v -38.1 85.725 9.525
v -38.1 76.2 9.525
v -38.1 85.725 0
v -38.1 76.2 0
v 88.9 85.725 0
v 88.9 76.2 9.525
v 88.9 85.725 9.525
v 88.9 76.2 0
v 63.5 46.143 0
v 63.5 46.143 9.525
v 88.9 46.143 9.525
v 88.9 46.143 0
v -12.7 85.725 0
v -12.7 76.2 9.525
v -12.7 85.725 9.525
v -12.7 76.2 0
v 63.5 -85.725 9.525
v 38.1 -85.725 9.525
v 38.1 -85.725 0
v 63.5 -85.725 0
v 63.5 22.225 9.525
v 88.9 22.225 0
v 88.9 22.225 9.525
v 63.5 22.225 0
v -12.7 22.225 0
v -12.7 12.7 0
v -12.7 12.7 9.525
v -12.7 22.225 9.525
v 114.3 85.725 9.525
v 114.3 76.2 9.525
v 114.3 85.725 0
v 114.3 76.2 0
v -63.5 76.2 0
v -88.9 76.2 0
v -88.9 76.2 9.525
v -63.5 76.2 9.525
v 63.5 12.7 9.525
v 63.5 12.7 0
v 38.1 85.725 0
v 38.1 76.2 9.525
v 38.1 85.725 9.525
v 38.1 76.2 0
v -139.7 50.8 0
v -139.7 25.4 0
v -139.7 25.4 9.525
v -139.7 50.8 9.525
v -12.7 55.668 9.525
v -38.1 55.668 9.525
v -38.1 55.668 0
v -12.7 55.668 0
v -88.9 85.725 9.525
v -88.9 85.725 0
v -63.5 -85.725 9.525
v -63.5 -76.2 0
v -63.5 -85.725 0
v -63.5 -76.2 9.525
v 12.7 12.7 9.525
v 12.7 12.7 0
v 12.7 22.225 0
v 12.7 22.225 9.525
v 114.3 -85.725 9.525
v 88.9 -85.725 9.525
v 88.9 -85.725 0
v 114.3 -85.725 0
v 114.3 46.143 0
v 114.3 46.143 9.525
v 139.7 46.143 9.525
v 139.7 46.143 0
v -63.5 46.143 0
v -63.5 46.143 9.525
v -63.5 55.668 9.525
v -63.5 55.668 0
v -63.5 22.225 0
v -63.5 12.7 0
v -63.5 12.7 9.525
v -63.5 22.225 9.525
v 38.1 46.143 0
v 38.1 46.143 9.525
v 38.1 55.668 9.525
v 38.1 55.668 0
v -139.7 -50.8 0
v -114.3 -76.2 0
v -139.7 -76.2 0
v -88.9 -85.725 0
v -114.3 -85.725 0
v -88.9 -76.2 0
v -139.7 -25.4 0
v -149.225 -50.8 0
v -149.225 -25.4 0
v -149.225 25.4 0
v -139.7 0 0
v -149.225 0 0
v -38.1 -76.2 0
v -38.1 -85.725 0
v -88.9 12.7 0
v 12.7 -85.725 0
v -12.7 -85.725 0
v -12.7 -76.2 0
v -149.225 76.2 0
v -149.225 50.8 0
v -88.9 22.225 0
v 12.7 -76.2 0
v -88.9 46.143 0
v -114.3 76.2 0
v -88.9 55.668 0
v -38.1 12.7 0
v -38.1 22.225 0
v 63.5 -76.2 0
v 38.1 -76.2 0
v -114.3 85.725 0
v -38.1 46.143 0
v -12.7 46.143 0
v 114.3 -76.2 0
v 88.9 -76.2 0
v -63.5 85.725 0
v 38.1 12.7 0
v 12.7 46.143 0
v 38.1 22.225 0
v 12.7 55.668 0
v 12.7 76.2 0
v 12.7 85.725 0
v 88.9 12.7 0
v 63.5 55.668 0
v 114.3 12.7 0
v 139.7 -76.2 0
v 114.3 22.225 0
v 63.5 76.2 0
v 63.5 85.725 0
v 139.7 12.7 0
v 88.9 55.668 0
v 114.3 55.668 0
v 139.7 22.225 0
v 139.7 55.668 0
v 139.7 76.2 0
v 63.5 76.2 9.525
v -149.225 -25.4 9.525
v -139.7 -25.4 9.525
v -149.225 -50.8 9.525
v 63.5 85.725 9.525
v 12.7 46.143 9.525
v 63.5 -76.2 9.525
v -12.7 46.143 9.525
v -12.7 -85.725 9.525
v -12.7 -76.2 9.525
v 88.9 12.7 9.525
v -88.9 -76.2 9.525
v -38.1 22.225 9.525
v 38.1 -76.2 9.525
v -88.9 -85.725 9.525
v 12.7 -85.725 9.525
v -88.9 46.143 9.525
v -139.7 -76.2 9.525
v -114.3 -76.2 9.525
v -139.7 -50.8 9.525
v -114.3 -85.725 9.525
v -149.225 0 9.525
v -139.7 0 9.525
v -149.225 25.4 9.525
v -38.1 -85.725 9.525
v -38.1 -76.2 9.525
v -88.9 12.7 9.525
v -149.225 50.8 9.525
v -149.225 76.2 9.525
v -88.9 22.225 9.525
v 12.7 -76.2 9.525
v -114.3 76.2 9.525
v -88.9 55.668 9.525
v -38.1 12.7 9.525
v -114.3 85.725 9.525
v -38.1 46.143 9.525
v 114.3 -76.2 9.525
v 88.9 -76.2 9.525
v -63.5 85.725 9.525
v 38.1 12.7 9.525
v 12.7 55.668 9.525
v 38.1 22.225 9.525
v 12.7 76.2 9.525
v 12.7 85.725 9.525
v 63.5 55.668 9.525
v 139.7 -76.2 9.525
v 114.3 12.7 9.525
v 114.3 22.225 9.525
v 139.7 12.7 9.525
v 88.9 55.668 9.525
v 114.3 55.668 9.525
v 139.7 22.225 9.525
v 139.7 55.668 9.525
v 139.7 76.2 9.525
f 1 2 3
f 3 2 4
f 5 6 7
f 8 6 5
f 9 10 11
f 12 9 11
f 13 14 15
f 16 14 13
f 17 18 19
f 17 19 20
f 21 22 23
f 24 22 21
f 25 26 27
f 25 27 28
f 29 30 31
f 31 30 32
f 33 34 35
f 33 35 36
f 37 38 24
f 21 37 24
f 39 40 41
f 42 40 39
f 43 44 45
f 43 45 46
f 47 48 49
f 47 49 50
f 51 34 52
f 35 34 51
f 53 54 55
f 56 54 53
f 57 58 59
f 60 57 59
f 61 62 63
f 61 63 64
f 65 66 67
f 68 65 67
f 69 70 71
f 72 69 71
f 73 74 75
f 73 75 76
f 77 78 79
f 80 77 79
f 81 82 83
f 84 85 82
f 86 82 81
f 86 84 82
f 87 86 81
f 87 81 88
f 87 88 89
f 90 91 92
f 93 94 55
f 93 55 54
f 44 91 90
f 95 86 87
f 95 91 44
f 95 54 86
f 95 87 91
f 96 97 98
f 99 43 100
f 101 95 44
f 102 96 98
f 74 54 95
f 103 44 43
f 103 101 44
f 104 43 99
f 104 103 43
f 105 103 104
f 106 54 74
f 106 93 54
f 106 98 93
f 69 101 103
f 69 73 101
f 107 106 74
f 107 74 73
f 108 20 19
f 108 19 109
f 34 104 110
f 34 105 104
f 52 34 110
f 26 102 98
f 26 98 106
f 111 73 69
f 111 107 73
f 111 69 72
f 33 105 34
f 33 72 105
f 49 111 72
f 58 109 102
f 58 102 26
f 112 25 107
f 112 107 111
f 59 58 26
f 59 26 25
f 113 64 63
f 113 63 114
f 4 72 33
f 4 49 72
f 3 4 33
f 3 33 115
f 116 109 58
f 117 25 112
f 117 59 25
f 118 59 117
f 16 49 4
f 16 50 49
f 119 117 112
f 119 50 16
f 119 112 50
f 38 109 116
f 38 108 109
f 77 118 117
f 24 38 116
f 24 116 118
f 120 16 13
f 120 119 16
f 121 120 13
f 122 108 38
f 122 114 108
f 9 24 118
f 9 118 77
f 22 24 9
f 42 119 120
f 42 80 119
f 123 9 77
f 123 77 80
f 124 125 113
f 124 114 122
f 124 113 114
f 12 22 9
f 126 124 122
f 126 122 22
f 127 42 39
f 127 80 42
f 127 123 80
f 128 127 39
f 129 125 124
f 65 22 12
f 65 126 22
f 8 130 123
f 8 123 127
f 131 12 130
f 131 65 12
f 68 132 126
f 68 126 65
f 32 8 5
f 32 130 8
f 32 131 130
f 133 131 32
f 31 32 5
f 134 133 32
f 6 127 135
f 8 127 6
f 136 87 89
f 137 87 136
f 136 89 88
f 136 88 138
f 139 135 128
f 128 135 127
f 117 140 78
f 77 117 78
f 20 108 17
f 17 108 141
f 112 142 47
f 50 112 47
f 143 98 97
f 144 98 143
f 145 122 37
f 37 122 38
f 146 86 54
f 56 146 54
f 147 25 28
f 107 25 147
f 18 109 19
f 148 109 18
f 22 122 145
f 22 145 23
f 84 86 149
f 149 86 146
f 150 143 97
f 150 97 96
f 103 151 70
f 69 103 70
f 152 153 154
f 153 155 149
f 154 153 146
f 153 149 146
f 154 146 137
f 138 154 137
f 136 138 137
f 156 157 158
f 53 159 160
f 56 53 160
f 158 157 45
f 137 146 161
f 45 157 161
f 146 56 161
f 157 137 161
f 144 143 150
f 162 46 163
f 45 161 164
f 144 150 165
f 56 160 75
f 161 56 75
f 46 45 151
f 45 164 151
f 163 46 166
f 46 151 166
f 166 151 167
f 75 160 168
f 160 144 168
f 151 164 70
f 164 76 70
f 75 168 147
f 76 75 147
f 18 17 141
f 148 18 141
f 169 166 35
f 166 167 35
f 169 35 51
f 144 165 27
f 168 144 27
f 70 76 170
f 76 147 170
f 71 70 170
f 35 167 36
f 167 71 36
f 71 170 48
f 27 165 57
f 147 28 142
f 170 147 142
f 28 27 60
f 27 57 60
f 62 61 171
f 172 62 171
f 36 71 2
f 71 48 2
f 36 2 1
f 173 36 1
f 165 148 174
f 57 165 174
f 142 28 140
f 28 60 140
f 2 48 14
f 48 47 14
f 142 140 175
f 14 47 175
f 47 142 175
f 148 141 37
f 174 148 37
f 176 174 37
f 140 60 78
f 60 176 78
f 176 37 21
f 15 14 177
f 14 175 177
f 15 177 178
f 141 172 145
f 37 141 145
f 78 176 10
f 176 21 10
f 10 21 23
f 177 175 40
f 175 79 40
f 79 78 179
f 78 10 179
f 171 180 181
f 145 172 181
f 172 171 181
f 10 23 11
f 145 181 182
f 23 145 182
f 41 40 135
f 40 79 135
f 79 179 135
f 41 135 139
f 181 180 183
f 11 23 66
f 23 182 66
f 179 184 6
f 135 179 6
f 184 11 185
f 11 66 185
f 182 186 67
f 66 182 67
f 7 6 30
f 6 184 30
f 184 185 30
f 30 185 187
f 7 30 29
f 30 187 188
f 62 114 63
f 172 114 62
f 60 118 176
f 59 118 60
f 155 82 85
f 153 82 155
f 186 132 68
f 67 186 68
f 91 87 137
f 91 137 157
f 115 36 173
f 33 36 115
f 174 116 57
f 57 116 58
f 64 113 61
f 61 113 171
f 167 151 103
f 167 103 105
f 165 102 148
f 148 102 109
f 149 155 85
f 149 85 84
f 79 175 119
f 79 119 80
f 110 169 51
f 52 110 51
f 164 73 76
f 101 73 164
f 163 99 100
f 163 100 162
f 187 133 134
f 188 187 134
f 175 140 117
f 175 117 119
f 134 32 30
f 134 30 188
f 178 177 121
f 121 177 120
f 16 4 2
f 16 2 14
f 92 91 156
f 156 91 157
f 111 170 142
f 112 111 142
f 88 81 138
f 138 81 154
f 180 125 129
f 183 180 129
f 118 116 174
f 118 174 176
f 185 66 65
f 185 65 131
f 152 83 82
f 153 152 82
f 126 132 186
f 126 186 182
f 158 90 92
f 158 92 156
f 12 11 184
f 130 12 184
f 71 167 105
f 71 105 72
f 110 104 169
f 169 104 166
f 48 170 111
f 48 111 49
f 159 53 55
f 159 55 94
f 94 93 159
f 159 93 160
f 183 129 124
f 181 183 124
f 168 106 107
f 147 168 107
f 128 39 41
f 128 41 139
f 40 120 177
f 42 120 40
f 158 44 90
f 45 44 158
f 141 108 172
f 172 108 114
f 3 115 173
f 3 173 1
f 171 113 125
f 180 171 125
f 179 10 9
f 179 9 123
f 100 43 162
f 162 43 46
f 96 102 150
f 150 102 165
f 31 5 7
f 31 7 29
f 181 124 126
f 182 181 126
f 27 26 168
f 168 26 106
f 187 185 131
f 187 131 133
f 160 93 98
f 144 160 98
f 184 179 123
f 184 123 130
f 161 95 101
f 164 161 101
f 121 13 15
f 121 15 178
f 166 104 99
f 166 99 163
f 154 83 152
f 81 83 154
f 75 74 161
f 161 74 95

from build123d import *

# Parameters (mm, degrees)
SKETCH1_W               = 279.4
SKETCH1_H               = 152.4
BOSS_EXTRUDE1_DEPTH     = 9.525
SKETCH2_W               = 25.4
SKETCH2_H               = 9.525
BOSS_EXTRUDE2_DEPTH     = 9.525
LPATTERN1_COUNT         = 5
LPATTERN1_PITCH         = 50.8
MIRROR1_COPY_1_SKETCH_W = 25.4
MIRROR1_COPY_1_SKETCH_H = 9.525
MIRROR1_COPY_1_DEPTH    = 9.525
MIRROR1_COPY_2_SKETCH_W = 25.4
MIRROR1_COPY_2_SKETCH_H = 9.525
MIRROR1_COPY_2_DEPTH    = 9.525
MIRROR1_COPY_3_SKETCH_W = 25.4
MIRROR1_COPY_3_SKETCH_H = 9.525
MIRROR1_COPY_3_DEPTH    = 9.525
MIRROR1_COPY_4_SKETCH_W = 25.4
MIRROR1_COPY_4_SKETCH_H = 9.525
MIRROR1_COPY_4_DEPTH    = 9.525
SKETCH3_W               = 9.525
SKETCH3_H               = 25.4
BOSS_EXTRUDE3_DEPTH     = 9.525
LPATTERN2_COUNT         = 3
LPATTERN2_PITCH         = 50.8
SKETCH4_W               = 25.4
SKETCH4_H               = 9.525
CUT_EXTRUDE1_DEPTH      = 10.525
LPATTERN3_COUNT         = 5
LPATTERN3_PITCH         = 50.8
SKETCH5_W               = 25.4
SKETCH5_H               = 9.525
CUT_EXTRUDE2_DEPTH      = 10.525
LPATTERN4_COUNT         = 5
LPATTERN4_PITCH         = 50.8


with BuildPart() as part:
    # Sketch1 → Boss-Extrude1 (new body)
    with BuildSketch(Plane.XY):
        Rectangle(SKETCH1_W, SKETCH1_H)
    extrude(amount=BOSS_EXTRUDE1_DEPTH)

    # Sketch2 → Boss-Extrude2 (add)
    with BuildSketch(Plane.XZ.offset(76.2)):
        with Locations((-101.6, 4.7625)):
            Rectangle(SKETCH2_W, SKETCH2_H)
    boss_extrude2 = extrude(amount=BOSS_EXTRUDE2_DEPTH)

    # LPattern1: Boss-Extrude2 ×5
    with Locations(*[(i * LPATTERN1_PITCH, 0, 0) for i in range(1, LPATTERN1_COUNT)]):
        add(boss_extrude2)

    # Mirror1: Boss-Extrude2 across plane
    add(boss_extrude2.mirror(Plane.ZX))

    # Mirror1 copy 1 sketch → Mirror1 copy 1 (add)
    with BuildSketch(Plane(origin=(50.8, 76.2, 0), x_dir=(1, 0, 0), z_dir=(0, 1, 0))):
        with Locations((-101.6, -4.7625)):
            Rectangle(MIRROR1_COPY_1_SKETCH_W, MIRROR1_COPY_1_SKETCH_H)
    extrude(amount=MIRROR1_COPY_1_DEPTH)

    # Mirror1 copy 2 sketch → Mirror1 copy 2 (add)
    with BuildSketch(Plane(origin=(101.6, 76.2, 0), x_dir=(1, 0, 0), z_dir=(0, 1, 0))):
        with Locations((-101.6, -4.7625)):
            Rectangle(MIRROR1_COPY_2_SKETCH_W, MIRROR1_COPY_2_SKETCH_H)
    extrude(amount=MIRROR1_COPY_2_DEPTH)

    # Mirror1 copy 3 sketch → Mirror1 copy 3 (add)
    with BuildSketch(Plane(origin=(152.4, 76.2, 0), x_dir=(1, 0, 0), z_dir=(0, 1, 0))):
        with Locations((-101.6, -4.7625)):
            Rectangle(MIRROR1_COPY_3_SKETCH_W, MIRROR1_COPY_3_SKETCH_H)
    extrude(amount=MIRROR1_COPY_3_DEPTH)

    # Mirror1 copy 4 sketch → Mirror1 copy 4 (add)
    with BuildSketch(Plane(origin=(203.2, 76.2, 0), x_dir=(1, 0, 0), z_dir=(0, 1, 0))):
        with Locations((-101.6, -4.7625)):
            Rectangle(MIRROR1_COPY_4_SKETCH_W, MIRROR1_COPY_4_SKETCH_H)
    extrude(amount=MIRROR1_COPY_4_DEPTH)

    # Sketch3 → Boss-Extrude3 (add)
    with BuildSketch(Plane.ZY.offset(139.7)):
        with Locations((4.7625, 63.5)):
            Rectangle(SKETCH3_W, SKETCH3_H)
    boss_extrude3 = extrude(amount=BOSS_EXTRUDE3_DEPTH)

    # LPattern2: Boss-Extrude3 ×3
    with Locations(*[(0, -i * LPATTERN2_PITCH, 0) for i in range(1, LPATTERN2_COUNT)]):
        add(boss_extrude3)

    # Sketch4 → Cut-Extrude1 (cut, through all)
    with BuildSketch(Plane(origin=(0, 0, 0), x_dir=(-1, 0, 0), z_dir=(0, 0, -1))):
        with Locations((-127, 17.4625)):
            Rectangle(SKETCH4_W, SKETCH4_H)
    cut_extrude1 = extrude(amount=-CUT_EXTRUDE1_DEPTH, mode=Mode.SUBTRACT)

    # LPattern3: Cut-Extrude1 ×5
    with Locations(*[(-i * LPATTERN3_PITCH, 0, 0) for i in range(1, LPATTERN3_COUNT)]):
        add(cut_extrude1, mode=Mode.SUBTRACT)

    # Sketch5 → Cut-Extrude2 (cut, through all)
    with BuildSketch(Plane.XY.offset(9.525)):
        with Locations((-76.2, 50.905277904)):
            Rectangle(SKETCH5_W, SKETCH5_H)
    cut_extrude2 = extrude(amount=-CUT_EXTRUDE2_DEPTH, mode=Mode.SUBTRACT)

    # LPattern4: Cut-Extrude2 ×5
    with Locations(*[(i * LPATTERN4_PITCH, 0, 0) for i in range(1, LPATTERN4_COUNT)]):
        add(cut_extrude2, mode=Mode.SUBTRACT)


solid = part.part
